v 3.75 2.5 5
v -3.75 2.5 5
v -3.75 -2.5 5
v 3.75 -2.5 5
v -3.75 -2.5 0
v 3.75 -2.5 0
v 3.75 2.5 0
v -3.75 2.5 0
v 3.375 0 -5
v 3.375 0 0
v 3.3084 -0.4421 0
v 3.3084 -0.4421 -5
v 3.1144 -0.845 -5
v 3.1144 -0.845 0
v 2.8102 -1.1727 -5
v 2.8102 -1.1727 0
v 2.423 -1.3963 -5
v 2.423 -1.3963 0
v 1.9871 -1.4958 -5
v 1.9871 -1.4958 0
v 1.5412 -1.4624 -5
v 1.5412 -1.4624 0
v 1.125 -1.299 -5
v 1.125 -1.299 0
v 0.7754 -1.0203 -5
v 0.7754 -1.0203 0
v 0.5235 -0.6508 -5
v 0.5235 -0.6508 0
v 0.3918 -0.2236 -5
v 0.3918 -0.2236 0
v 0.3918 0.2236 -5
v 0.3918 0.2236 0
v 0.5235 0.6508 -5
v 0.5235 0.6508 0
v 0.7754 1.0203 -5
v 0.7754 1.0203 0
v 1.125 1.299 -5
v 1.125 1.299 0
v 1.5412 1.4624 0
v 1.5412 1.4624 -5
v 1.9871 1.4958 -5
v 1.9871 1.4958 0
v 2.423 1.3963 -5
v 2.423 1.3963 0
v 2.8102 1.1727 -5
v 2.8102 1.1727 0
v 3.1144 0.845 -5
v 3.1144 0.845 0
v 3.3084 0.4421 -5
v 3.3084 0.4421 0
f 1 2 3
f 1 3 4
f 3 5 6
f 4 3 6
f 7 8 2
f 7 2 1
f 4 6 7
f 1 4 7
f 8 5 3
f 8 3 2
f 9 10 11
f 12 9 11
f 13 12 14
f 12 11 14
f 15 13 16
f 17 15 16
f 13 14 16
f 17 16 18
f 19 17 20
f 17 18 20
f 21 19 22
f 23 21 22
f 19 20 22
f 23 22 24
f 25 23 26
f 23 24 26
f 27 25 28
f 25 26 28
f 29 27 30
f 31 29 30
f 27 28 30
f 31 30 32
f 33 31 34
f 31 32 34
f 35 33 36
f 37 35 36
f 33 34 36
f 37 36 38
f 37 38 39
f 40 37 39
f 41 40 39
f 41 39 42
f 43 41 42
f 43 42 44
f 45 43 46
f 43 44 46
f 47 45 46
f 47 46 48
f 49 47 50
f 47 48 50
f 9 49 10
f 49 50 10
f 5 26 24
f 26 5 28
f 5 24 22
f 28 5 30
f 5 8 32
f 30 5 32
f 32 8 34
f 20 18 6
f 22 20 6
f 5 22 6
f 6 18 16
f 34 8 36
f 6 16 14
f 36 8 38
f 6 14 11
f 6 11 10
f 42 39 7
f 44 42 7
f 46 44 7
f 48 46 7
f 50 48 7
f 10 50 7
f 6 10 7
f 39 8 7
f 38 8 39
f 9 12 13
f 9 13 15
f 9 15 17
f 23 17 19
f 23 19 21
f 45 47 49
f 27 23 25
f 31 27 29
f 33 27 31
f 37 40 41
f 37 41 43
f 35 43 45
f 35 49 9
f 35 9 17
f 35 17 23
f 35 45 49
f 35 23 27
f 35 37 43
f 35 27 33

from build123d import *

# Parameters (mm, degrees)
SKIZZE1_W                       = 7.5
SKIZZE1_H                       = 5
AUFSATZ_LINEAR_AUSTRAGEN1_DEPTH = 5
AUFSATZ_LINEAR_AUSTRAGEN2_DEPTH = 5


with BuildPart() as part:
    # Skizze1 → Aufsatz-Linear austragen1 (new body)
    with BuildSketch(Plane.XY):
        Rectangle(SKIZZE1_W, SKIZZE1_H)
    extrude(amount=AUFSATZ_LINEAR_AUSTRAGEN1_DEPTH)

    # Skizze2 → Aufsatz-Linear austragen2 (add)
    with BuildSketch(Plane(origin=(0, 0, 0), x_dir=(-1, 0, 0), z_dir=(0, 0, -1))):
        with BuildLine():
            ThreePointArc((-0.375, 0), (-1.875, 1.5), (-3.375, 0))
            Line((-3.375, 0), (-0.375, 0))
        make_face()
        with BuildLine():
            Line((-0.375, 0), (-3.375, 0))
            ThreePointArc((-3.375, 0), (-1.875, -1.5), (-0.375, 0))
        make_face()
    extrude(amount=AUFSATZ_LINEAR_AUSTRAGEN2_DEPTH)


solid = part.part
